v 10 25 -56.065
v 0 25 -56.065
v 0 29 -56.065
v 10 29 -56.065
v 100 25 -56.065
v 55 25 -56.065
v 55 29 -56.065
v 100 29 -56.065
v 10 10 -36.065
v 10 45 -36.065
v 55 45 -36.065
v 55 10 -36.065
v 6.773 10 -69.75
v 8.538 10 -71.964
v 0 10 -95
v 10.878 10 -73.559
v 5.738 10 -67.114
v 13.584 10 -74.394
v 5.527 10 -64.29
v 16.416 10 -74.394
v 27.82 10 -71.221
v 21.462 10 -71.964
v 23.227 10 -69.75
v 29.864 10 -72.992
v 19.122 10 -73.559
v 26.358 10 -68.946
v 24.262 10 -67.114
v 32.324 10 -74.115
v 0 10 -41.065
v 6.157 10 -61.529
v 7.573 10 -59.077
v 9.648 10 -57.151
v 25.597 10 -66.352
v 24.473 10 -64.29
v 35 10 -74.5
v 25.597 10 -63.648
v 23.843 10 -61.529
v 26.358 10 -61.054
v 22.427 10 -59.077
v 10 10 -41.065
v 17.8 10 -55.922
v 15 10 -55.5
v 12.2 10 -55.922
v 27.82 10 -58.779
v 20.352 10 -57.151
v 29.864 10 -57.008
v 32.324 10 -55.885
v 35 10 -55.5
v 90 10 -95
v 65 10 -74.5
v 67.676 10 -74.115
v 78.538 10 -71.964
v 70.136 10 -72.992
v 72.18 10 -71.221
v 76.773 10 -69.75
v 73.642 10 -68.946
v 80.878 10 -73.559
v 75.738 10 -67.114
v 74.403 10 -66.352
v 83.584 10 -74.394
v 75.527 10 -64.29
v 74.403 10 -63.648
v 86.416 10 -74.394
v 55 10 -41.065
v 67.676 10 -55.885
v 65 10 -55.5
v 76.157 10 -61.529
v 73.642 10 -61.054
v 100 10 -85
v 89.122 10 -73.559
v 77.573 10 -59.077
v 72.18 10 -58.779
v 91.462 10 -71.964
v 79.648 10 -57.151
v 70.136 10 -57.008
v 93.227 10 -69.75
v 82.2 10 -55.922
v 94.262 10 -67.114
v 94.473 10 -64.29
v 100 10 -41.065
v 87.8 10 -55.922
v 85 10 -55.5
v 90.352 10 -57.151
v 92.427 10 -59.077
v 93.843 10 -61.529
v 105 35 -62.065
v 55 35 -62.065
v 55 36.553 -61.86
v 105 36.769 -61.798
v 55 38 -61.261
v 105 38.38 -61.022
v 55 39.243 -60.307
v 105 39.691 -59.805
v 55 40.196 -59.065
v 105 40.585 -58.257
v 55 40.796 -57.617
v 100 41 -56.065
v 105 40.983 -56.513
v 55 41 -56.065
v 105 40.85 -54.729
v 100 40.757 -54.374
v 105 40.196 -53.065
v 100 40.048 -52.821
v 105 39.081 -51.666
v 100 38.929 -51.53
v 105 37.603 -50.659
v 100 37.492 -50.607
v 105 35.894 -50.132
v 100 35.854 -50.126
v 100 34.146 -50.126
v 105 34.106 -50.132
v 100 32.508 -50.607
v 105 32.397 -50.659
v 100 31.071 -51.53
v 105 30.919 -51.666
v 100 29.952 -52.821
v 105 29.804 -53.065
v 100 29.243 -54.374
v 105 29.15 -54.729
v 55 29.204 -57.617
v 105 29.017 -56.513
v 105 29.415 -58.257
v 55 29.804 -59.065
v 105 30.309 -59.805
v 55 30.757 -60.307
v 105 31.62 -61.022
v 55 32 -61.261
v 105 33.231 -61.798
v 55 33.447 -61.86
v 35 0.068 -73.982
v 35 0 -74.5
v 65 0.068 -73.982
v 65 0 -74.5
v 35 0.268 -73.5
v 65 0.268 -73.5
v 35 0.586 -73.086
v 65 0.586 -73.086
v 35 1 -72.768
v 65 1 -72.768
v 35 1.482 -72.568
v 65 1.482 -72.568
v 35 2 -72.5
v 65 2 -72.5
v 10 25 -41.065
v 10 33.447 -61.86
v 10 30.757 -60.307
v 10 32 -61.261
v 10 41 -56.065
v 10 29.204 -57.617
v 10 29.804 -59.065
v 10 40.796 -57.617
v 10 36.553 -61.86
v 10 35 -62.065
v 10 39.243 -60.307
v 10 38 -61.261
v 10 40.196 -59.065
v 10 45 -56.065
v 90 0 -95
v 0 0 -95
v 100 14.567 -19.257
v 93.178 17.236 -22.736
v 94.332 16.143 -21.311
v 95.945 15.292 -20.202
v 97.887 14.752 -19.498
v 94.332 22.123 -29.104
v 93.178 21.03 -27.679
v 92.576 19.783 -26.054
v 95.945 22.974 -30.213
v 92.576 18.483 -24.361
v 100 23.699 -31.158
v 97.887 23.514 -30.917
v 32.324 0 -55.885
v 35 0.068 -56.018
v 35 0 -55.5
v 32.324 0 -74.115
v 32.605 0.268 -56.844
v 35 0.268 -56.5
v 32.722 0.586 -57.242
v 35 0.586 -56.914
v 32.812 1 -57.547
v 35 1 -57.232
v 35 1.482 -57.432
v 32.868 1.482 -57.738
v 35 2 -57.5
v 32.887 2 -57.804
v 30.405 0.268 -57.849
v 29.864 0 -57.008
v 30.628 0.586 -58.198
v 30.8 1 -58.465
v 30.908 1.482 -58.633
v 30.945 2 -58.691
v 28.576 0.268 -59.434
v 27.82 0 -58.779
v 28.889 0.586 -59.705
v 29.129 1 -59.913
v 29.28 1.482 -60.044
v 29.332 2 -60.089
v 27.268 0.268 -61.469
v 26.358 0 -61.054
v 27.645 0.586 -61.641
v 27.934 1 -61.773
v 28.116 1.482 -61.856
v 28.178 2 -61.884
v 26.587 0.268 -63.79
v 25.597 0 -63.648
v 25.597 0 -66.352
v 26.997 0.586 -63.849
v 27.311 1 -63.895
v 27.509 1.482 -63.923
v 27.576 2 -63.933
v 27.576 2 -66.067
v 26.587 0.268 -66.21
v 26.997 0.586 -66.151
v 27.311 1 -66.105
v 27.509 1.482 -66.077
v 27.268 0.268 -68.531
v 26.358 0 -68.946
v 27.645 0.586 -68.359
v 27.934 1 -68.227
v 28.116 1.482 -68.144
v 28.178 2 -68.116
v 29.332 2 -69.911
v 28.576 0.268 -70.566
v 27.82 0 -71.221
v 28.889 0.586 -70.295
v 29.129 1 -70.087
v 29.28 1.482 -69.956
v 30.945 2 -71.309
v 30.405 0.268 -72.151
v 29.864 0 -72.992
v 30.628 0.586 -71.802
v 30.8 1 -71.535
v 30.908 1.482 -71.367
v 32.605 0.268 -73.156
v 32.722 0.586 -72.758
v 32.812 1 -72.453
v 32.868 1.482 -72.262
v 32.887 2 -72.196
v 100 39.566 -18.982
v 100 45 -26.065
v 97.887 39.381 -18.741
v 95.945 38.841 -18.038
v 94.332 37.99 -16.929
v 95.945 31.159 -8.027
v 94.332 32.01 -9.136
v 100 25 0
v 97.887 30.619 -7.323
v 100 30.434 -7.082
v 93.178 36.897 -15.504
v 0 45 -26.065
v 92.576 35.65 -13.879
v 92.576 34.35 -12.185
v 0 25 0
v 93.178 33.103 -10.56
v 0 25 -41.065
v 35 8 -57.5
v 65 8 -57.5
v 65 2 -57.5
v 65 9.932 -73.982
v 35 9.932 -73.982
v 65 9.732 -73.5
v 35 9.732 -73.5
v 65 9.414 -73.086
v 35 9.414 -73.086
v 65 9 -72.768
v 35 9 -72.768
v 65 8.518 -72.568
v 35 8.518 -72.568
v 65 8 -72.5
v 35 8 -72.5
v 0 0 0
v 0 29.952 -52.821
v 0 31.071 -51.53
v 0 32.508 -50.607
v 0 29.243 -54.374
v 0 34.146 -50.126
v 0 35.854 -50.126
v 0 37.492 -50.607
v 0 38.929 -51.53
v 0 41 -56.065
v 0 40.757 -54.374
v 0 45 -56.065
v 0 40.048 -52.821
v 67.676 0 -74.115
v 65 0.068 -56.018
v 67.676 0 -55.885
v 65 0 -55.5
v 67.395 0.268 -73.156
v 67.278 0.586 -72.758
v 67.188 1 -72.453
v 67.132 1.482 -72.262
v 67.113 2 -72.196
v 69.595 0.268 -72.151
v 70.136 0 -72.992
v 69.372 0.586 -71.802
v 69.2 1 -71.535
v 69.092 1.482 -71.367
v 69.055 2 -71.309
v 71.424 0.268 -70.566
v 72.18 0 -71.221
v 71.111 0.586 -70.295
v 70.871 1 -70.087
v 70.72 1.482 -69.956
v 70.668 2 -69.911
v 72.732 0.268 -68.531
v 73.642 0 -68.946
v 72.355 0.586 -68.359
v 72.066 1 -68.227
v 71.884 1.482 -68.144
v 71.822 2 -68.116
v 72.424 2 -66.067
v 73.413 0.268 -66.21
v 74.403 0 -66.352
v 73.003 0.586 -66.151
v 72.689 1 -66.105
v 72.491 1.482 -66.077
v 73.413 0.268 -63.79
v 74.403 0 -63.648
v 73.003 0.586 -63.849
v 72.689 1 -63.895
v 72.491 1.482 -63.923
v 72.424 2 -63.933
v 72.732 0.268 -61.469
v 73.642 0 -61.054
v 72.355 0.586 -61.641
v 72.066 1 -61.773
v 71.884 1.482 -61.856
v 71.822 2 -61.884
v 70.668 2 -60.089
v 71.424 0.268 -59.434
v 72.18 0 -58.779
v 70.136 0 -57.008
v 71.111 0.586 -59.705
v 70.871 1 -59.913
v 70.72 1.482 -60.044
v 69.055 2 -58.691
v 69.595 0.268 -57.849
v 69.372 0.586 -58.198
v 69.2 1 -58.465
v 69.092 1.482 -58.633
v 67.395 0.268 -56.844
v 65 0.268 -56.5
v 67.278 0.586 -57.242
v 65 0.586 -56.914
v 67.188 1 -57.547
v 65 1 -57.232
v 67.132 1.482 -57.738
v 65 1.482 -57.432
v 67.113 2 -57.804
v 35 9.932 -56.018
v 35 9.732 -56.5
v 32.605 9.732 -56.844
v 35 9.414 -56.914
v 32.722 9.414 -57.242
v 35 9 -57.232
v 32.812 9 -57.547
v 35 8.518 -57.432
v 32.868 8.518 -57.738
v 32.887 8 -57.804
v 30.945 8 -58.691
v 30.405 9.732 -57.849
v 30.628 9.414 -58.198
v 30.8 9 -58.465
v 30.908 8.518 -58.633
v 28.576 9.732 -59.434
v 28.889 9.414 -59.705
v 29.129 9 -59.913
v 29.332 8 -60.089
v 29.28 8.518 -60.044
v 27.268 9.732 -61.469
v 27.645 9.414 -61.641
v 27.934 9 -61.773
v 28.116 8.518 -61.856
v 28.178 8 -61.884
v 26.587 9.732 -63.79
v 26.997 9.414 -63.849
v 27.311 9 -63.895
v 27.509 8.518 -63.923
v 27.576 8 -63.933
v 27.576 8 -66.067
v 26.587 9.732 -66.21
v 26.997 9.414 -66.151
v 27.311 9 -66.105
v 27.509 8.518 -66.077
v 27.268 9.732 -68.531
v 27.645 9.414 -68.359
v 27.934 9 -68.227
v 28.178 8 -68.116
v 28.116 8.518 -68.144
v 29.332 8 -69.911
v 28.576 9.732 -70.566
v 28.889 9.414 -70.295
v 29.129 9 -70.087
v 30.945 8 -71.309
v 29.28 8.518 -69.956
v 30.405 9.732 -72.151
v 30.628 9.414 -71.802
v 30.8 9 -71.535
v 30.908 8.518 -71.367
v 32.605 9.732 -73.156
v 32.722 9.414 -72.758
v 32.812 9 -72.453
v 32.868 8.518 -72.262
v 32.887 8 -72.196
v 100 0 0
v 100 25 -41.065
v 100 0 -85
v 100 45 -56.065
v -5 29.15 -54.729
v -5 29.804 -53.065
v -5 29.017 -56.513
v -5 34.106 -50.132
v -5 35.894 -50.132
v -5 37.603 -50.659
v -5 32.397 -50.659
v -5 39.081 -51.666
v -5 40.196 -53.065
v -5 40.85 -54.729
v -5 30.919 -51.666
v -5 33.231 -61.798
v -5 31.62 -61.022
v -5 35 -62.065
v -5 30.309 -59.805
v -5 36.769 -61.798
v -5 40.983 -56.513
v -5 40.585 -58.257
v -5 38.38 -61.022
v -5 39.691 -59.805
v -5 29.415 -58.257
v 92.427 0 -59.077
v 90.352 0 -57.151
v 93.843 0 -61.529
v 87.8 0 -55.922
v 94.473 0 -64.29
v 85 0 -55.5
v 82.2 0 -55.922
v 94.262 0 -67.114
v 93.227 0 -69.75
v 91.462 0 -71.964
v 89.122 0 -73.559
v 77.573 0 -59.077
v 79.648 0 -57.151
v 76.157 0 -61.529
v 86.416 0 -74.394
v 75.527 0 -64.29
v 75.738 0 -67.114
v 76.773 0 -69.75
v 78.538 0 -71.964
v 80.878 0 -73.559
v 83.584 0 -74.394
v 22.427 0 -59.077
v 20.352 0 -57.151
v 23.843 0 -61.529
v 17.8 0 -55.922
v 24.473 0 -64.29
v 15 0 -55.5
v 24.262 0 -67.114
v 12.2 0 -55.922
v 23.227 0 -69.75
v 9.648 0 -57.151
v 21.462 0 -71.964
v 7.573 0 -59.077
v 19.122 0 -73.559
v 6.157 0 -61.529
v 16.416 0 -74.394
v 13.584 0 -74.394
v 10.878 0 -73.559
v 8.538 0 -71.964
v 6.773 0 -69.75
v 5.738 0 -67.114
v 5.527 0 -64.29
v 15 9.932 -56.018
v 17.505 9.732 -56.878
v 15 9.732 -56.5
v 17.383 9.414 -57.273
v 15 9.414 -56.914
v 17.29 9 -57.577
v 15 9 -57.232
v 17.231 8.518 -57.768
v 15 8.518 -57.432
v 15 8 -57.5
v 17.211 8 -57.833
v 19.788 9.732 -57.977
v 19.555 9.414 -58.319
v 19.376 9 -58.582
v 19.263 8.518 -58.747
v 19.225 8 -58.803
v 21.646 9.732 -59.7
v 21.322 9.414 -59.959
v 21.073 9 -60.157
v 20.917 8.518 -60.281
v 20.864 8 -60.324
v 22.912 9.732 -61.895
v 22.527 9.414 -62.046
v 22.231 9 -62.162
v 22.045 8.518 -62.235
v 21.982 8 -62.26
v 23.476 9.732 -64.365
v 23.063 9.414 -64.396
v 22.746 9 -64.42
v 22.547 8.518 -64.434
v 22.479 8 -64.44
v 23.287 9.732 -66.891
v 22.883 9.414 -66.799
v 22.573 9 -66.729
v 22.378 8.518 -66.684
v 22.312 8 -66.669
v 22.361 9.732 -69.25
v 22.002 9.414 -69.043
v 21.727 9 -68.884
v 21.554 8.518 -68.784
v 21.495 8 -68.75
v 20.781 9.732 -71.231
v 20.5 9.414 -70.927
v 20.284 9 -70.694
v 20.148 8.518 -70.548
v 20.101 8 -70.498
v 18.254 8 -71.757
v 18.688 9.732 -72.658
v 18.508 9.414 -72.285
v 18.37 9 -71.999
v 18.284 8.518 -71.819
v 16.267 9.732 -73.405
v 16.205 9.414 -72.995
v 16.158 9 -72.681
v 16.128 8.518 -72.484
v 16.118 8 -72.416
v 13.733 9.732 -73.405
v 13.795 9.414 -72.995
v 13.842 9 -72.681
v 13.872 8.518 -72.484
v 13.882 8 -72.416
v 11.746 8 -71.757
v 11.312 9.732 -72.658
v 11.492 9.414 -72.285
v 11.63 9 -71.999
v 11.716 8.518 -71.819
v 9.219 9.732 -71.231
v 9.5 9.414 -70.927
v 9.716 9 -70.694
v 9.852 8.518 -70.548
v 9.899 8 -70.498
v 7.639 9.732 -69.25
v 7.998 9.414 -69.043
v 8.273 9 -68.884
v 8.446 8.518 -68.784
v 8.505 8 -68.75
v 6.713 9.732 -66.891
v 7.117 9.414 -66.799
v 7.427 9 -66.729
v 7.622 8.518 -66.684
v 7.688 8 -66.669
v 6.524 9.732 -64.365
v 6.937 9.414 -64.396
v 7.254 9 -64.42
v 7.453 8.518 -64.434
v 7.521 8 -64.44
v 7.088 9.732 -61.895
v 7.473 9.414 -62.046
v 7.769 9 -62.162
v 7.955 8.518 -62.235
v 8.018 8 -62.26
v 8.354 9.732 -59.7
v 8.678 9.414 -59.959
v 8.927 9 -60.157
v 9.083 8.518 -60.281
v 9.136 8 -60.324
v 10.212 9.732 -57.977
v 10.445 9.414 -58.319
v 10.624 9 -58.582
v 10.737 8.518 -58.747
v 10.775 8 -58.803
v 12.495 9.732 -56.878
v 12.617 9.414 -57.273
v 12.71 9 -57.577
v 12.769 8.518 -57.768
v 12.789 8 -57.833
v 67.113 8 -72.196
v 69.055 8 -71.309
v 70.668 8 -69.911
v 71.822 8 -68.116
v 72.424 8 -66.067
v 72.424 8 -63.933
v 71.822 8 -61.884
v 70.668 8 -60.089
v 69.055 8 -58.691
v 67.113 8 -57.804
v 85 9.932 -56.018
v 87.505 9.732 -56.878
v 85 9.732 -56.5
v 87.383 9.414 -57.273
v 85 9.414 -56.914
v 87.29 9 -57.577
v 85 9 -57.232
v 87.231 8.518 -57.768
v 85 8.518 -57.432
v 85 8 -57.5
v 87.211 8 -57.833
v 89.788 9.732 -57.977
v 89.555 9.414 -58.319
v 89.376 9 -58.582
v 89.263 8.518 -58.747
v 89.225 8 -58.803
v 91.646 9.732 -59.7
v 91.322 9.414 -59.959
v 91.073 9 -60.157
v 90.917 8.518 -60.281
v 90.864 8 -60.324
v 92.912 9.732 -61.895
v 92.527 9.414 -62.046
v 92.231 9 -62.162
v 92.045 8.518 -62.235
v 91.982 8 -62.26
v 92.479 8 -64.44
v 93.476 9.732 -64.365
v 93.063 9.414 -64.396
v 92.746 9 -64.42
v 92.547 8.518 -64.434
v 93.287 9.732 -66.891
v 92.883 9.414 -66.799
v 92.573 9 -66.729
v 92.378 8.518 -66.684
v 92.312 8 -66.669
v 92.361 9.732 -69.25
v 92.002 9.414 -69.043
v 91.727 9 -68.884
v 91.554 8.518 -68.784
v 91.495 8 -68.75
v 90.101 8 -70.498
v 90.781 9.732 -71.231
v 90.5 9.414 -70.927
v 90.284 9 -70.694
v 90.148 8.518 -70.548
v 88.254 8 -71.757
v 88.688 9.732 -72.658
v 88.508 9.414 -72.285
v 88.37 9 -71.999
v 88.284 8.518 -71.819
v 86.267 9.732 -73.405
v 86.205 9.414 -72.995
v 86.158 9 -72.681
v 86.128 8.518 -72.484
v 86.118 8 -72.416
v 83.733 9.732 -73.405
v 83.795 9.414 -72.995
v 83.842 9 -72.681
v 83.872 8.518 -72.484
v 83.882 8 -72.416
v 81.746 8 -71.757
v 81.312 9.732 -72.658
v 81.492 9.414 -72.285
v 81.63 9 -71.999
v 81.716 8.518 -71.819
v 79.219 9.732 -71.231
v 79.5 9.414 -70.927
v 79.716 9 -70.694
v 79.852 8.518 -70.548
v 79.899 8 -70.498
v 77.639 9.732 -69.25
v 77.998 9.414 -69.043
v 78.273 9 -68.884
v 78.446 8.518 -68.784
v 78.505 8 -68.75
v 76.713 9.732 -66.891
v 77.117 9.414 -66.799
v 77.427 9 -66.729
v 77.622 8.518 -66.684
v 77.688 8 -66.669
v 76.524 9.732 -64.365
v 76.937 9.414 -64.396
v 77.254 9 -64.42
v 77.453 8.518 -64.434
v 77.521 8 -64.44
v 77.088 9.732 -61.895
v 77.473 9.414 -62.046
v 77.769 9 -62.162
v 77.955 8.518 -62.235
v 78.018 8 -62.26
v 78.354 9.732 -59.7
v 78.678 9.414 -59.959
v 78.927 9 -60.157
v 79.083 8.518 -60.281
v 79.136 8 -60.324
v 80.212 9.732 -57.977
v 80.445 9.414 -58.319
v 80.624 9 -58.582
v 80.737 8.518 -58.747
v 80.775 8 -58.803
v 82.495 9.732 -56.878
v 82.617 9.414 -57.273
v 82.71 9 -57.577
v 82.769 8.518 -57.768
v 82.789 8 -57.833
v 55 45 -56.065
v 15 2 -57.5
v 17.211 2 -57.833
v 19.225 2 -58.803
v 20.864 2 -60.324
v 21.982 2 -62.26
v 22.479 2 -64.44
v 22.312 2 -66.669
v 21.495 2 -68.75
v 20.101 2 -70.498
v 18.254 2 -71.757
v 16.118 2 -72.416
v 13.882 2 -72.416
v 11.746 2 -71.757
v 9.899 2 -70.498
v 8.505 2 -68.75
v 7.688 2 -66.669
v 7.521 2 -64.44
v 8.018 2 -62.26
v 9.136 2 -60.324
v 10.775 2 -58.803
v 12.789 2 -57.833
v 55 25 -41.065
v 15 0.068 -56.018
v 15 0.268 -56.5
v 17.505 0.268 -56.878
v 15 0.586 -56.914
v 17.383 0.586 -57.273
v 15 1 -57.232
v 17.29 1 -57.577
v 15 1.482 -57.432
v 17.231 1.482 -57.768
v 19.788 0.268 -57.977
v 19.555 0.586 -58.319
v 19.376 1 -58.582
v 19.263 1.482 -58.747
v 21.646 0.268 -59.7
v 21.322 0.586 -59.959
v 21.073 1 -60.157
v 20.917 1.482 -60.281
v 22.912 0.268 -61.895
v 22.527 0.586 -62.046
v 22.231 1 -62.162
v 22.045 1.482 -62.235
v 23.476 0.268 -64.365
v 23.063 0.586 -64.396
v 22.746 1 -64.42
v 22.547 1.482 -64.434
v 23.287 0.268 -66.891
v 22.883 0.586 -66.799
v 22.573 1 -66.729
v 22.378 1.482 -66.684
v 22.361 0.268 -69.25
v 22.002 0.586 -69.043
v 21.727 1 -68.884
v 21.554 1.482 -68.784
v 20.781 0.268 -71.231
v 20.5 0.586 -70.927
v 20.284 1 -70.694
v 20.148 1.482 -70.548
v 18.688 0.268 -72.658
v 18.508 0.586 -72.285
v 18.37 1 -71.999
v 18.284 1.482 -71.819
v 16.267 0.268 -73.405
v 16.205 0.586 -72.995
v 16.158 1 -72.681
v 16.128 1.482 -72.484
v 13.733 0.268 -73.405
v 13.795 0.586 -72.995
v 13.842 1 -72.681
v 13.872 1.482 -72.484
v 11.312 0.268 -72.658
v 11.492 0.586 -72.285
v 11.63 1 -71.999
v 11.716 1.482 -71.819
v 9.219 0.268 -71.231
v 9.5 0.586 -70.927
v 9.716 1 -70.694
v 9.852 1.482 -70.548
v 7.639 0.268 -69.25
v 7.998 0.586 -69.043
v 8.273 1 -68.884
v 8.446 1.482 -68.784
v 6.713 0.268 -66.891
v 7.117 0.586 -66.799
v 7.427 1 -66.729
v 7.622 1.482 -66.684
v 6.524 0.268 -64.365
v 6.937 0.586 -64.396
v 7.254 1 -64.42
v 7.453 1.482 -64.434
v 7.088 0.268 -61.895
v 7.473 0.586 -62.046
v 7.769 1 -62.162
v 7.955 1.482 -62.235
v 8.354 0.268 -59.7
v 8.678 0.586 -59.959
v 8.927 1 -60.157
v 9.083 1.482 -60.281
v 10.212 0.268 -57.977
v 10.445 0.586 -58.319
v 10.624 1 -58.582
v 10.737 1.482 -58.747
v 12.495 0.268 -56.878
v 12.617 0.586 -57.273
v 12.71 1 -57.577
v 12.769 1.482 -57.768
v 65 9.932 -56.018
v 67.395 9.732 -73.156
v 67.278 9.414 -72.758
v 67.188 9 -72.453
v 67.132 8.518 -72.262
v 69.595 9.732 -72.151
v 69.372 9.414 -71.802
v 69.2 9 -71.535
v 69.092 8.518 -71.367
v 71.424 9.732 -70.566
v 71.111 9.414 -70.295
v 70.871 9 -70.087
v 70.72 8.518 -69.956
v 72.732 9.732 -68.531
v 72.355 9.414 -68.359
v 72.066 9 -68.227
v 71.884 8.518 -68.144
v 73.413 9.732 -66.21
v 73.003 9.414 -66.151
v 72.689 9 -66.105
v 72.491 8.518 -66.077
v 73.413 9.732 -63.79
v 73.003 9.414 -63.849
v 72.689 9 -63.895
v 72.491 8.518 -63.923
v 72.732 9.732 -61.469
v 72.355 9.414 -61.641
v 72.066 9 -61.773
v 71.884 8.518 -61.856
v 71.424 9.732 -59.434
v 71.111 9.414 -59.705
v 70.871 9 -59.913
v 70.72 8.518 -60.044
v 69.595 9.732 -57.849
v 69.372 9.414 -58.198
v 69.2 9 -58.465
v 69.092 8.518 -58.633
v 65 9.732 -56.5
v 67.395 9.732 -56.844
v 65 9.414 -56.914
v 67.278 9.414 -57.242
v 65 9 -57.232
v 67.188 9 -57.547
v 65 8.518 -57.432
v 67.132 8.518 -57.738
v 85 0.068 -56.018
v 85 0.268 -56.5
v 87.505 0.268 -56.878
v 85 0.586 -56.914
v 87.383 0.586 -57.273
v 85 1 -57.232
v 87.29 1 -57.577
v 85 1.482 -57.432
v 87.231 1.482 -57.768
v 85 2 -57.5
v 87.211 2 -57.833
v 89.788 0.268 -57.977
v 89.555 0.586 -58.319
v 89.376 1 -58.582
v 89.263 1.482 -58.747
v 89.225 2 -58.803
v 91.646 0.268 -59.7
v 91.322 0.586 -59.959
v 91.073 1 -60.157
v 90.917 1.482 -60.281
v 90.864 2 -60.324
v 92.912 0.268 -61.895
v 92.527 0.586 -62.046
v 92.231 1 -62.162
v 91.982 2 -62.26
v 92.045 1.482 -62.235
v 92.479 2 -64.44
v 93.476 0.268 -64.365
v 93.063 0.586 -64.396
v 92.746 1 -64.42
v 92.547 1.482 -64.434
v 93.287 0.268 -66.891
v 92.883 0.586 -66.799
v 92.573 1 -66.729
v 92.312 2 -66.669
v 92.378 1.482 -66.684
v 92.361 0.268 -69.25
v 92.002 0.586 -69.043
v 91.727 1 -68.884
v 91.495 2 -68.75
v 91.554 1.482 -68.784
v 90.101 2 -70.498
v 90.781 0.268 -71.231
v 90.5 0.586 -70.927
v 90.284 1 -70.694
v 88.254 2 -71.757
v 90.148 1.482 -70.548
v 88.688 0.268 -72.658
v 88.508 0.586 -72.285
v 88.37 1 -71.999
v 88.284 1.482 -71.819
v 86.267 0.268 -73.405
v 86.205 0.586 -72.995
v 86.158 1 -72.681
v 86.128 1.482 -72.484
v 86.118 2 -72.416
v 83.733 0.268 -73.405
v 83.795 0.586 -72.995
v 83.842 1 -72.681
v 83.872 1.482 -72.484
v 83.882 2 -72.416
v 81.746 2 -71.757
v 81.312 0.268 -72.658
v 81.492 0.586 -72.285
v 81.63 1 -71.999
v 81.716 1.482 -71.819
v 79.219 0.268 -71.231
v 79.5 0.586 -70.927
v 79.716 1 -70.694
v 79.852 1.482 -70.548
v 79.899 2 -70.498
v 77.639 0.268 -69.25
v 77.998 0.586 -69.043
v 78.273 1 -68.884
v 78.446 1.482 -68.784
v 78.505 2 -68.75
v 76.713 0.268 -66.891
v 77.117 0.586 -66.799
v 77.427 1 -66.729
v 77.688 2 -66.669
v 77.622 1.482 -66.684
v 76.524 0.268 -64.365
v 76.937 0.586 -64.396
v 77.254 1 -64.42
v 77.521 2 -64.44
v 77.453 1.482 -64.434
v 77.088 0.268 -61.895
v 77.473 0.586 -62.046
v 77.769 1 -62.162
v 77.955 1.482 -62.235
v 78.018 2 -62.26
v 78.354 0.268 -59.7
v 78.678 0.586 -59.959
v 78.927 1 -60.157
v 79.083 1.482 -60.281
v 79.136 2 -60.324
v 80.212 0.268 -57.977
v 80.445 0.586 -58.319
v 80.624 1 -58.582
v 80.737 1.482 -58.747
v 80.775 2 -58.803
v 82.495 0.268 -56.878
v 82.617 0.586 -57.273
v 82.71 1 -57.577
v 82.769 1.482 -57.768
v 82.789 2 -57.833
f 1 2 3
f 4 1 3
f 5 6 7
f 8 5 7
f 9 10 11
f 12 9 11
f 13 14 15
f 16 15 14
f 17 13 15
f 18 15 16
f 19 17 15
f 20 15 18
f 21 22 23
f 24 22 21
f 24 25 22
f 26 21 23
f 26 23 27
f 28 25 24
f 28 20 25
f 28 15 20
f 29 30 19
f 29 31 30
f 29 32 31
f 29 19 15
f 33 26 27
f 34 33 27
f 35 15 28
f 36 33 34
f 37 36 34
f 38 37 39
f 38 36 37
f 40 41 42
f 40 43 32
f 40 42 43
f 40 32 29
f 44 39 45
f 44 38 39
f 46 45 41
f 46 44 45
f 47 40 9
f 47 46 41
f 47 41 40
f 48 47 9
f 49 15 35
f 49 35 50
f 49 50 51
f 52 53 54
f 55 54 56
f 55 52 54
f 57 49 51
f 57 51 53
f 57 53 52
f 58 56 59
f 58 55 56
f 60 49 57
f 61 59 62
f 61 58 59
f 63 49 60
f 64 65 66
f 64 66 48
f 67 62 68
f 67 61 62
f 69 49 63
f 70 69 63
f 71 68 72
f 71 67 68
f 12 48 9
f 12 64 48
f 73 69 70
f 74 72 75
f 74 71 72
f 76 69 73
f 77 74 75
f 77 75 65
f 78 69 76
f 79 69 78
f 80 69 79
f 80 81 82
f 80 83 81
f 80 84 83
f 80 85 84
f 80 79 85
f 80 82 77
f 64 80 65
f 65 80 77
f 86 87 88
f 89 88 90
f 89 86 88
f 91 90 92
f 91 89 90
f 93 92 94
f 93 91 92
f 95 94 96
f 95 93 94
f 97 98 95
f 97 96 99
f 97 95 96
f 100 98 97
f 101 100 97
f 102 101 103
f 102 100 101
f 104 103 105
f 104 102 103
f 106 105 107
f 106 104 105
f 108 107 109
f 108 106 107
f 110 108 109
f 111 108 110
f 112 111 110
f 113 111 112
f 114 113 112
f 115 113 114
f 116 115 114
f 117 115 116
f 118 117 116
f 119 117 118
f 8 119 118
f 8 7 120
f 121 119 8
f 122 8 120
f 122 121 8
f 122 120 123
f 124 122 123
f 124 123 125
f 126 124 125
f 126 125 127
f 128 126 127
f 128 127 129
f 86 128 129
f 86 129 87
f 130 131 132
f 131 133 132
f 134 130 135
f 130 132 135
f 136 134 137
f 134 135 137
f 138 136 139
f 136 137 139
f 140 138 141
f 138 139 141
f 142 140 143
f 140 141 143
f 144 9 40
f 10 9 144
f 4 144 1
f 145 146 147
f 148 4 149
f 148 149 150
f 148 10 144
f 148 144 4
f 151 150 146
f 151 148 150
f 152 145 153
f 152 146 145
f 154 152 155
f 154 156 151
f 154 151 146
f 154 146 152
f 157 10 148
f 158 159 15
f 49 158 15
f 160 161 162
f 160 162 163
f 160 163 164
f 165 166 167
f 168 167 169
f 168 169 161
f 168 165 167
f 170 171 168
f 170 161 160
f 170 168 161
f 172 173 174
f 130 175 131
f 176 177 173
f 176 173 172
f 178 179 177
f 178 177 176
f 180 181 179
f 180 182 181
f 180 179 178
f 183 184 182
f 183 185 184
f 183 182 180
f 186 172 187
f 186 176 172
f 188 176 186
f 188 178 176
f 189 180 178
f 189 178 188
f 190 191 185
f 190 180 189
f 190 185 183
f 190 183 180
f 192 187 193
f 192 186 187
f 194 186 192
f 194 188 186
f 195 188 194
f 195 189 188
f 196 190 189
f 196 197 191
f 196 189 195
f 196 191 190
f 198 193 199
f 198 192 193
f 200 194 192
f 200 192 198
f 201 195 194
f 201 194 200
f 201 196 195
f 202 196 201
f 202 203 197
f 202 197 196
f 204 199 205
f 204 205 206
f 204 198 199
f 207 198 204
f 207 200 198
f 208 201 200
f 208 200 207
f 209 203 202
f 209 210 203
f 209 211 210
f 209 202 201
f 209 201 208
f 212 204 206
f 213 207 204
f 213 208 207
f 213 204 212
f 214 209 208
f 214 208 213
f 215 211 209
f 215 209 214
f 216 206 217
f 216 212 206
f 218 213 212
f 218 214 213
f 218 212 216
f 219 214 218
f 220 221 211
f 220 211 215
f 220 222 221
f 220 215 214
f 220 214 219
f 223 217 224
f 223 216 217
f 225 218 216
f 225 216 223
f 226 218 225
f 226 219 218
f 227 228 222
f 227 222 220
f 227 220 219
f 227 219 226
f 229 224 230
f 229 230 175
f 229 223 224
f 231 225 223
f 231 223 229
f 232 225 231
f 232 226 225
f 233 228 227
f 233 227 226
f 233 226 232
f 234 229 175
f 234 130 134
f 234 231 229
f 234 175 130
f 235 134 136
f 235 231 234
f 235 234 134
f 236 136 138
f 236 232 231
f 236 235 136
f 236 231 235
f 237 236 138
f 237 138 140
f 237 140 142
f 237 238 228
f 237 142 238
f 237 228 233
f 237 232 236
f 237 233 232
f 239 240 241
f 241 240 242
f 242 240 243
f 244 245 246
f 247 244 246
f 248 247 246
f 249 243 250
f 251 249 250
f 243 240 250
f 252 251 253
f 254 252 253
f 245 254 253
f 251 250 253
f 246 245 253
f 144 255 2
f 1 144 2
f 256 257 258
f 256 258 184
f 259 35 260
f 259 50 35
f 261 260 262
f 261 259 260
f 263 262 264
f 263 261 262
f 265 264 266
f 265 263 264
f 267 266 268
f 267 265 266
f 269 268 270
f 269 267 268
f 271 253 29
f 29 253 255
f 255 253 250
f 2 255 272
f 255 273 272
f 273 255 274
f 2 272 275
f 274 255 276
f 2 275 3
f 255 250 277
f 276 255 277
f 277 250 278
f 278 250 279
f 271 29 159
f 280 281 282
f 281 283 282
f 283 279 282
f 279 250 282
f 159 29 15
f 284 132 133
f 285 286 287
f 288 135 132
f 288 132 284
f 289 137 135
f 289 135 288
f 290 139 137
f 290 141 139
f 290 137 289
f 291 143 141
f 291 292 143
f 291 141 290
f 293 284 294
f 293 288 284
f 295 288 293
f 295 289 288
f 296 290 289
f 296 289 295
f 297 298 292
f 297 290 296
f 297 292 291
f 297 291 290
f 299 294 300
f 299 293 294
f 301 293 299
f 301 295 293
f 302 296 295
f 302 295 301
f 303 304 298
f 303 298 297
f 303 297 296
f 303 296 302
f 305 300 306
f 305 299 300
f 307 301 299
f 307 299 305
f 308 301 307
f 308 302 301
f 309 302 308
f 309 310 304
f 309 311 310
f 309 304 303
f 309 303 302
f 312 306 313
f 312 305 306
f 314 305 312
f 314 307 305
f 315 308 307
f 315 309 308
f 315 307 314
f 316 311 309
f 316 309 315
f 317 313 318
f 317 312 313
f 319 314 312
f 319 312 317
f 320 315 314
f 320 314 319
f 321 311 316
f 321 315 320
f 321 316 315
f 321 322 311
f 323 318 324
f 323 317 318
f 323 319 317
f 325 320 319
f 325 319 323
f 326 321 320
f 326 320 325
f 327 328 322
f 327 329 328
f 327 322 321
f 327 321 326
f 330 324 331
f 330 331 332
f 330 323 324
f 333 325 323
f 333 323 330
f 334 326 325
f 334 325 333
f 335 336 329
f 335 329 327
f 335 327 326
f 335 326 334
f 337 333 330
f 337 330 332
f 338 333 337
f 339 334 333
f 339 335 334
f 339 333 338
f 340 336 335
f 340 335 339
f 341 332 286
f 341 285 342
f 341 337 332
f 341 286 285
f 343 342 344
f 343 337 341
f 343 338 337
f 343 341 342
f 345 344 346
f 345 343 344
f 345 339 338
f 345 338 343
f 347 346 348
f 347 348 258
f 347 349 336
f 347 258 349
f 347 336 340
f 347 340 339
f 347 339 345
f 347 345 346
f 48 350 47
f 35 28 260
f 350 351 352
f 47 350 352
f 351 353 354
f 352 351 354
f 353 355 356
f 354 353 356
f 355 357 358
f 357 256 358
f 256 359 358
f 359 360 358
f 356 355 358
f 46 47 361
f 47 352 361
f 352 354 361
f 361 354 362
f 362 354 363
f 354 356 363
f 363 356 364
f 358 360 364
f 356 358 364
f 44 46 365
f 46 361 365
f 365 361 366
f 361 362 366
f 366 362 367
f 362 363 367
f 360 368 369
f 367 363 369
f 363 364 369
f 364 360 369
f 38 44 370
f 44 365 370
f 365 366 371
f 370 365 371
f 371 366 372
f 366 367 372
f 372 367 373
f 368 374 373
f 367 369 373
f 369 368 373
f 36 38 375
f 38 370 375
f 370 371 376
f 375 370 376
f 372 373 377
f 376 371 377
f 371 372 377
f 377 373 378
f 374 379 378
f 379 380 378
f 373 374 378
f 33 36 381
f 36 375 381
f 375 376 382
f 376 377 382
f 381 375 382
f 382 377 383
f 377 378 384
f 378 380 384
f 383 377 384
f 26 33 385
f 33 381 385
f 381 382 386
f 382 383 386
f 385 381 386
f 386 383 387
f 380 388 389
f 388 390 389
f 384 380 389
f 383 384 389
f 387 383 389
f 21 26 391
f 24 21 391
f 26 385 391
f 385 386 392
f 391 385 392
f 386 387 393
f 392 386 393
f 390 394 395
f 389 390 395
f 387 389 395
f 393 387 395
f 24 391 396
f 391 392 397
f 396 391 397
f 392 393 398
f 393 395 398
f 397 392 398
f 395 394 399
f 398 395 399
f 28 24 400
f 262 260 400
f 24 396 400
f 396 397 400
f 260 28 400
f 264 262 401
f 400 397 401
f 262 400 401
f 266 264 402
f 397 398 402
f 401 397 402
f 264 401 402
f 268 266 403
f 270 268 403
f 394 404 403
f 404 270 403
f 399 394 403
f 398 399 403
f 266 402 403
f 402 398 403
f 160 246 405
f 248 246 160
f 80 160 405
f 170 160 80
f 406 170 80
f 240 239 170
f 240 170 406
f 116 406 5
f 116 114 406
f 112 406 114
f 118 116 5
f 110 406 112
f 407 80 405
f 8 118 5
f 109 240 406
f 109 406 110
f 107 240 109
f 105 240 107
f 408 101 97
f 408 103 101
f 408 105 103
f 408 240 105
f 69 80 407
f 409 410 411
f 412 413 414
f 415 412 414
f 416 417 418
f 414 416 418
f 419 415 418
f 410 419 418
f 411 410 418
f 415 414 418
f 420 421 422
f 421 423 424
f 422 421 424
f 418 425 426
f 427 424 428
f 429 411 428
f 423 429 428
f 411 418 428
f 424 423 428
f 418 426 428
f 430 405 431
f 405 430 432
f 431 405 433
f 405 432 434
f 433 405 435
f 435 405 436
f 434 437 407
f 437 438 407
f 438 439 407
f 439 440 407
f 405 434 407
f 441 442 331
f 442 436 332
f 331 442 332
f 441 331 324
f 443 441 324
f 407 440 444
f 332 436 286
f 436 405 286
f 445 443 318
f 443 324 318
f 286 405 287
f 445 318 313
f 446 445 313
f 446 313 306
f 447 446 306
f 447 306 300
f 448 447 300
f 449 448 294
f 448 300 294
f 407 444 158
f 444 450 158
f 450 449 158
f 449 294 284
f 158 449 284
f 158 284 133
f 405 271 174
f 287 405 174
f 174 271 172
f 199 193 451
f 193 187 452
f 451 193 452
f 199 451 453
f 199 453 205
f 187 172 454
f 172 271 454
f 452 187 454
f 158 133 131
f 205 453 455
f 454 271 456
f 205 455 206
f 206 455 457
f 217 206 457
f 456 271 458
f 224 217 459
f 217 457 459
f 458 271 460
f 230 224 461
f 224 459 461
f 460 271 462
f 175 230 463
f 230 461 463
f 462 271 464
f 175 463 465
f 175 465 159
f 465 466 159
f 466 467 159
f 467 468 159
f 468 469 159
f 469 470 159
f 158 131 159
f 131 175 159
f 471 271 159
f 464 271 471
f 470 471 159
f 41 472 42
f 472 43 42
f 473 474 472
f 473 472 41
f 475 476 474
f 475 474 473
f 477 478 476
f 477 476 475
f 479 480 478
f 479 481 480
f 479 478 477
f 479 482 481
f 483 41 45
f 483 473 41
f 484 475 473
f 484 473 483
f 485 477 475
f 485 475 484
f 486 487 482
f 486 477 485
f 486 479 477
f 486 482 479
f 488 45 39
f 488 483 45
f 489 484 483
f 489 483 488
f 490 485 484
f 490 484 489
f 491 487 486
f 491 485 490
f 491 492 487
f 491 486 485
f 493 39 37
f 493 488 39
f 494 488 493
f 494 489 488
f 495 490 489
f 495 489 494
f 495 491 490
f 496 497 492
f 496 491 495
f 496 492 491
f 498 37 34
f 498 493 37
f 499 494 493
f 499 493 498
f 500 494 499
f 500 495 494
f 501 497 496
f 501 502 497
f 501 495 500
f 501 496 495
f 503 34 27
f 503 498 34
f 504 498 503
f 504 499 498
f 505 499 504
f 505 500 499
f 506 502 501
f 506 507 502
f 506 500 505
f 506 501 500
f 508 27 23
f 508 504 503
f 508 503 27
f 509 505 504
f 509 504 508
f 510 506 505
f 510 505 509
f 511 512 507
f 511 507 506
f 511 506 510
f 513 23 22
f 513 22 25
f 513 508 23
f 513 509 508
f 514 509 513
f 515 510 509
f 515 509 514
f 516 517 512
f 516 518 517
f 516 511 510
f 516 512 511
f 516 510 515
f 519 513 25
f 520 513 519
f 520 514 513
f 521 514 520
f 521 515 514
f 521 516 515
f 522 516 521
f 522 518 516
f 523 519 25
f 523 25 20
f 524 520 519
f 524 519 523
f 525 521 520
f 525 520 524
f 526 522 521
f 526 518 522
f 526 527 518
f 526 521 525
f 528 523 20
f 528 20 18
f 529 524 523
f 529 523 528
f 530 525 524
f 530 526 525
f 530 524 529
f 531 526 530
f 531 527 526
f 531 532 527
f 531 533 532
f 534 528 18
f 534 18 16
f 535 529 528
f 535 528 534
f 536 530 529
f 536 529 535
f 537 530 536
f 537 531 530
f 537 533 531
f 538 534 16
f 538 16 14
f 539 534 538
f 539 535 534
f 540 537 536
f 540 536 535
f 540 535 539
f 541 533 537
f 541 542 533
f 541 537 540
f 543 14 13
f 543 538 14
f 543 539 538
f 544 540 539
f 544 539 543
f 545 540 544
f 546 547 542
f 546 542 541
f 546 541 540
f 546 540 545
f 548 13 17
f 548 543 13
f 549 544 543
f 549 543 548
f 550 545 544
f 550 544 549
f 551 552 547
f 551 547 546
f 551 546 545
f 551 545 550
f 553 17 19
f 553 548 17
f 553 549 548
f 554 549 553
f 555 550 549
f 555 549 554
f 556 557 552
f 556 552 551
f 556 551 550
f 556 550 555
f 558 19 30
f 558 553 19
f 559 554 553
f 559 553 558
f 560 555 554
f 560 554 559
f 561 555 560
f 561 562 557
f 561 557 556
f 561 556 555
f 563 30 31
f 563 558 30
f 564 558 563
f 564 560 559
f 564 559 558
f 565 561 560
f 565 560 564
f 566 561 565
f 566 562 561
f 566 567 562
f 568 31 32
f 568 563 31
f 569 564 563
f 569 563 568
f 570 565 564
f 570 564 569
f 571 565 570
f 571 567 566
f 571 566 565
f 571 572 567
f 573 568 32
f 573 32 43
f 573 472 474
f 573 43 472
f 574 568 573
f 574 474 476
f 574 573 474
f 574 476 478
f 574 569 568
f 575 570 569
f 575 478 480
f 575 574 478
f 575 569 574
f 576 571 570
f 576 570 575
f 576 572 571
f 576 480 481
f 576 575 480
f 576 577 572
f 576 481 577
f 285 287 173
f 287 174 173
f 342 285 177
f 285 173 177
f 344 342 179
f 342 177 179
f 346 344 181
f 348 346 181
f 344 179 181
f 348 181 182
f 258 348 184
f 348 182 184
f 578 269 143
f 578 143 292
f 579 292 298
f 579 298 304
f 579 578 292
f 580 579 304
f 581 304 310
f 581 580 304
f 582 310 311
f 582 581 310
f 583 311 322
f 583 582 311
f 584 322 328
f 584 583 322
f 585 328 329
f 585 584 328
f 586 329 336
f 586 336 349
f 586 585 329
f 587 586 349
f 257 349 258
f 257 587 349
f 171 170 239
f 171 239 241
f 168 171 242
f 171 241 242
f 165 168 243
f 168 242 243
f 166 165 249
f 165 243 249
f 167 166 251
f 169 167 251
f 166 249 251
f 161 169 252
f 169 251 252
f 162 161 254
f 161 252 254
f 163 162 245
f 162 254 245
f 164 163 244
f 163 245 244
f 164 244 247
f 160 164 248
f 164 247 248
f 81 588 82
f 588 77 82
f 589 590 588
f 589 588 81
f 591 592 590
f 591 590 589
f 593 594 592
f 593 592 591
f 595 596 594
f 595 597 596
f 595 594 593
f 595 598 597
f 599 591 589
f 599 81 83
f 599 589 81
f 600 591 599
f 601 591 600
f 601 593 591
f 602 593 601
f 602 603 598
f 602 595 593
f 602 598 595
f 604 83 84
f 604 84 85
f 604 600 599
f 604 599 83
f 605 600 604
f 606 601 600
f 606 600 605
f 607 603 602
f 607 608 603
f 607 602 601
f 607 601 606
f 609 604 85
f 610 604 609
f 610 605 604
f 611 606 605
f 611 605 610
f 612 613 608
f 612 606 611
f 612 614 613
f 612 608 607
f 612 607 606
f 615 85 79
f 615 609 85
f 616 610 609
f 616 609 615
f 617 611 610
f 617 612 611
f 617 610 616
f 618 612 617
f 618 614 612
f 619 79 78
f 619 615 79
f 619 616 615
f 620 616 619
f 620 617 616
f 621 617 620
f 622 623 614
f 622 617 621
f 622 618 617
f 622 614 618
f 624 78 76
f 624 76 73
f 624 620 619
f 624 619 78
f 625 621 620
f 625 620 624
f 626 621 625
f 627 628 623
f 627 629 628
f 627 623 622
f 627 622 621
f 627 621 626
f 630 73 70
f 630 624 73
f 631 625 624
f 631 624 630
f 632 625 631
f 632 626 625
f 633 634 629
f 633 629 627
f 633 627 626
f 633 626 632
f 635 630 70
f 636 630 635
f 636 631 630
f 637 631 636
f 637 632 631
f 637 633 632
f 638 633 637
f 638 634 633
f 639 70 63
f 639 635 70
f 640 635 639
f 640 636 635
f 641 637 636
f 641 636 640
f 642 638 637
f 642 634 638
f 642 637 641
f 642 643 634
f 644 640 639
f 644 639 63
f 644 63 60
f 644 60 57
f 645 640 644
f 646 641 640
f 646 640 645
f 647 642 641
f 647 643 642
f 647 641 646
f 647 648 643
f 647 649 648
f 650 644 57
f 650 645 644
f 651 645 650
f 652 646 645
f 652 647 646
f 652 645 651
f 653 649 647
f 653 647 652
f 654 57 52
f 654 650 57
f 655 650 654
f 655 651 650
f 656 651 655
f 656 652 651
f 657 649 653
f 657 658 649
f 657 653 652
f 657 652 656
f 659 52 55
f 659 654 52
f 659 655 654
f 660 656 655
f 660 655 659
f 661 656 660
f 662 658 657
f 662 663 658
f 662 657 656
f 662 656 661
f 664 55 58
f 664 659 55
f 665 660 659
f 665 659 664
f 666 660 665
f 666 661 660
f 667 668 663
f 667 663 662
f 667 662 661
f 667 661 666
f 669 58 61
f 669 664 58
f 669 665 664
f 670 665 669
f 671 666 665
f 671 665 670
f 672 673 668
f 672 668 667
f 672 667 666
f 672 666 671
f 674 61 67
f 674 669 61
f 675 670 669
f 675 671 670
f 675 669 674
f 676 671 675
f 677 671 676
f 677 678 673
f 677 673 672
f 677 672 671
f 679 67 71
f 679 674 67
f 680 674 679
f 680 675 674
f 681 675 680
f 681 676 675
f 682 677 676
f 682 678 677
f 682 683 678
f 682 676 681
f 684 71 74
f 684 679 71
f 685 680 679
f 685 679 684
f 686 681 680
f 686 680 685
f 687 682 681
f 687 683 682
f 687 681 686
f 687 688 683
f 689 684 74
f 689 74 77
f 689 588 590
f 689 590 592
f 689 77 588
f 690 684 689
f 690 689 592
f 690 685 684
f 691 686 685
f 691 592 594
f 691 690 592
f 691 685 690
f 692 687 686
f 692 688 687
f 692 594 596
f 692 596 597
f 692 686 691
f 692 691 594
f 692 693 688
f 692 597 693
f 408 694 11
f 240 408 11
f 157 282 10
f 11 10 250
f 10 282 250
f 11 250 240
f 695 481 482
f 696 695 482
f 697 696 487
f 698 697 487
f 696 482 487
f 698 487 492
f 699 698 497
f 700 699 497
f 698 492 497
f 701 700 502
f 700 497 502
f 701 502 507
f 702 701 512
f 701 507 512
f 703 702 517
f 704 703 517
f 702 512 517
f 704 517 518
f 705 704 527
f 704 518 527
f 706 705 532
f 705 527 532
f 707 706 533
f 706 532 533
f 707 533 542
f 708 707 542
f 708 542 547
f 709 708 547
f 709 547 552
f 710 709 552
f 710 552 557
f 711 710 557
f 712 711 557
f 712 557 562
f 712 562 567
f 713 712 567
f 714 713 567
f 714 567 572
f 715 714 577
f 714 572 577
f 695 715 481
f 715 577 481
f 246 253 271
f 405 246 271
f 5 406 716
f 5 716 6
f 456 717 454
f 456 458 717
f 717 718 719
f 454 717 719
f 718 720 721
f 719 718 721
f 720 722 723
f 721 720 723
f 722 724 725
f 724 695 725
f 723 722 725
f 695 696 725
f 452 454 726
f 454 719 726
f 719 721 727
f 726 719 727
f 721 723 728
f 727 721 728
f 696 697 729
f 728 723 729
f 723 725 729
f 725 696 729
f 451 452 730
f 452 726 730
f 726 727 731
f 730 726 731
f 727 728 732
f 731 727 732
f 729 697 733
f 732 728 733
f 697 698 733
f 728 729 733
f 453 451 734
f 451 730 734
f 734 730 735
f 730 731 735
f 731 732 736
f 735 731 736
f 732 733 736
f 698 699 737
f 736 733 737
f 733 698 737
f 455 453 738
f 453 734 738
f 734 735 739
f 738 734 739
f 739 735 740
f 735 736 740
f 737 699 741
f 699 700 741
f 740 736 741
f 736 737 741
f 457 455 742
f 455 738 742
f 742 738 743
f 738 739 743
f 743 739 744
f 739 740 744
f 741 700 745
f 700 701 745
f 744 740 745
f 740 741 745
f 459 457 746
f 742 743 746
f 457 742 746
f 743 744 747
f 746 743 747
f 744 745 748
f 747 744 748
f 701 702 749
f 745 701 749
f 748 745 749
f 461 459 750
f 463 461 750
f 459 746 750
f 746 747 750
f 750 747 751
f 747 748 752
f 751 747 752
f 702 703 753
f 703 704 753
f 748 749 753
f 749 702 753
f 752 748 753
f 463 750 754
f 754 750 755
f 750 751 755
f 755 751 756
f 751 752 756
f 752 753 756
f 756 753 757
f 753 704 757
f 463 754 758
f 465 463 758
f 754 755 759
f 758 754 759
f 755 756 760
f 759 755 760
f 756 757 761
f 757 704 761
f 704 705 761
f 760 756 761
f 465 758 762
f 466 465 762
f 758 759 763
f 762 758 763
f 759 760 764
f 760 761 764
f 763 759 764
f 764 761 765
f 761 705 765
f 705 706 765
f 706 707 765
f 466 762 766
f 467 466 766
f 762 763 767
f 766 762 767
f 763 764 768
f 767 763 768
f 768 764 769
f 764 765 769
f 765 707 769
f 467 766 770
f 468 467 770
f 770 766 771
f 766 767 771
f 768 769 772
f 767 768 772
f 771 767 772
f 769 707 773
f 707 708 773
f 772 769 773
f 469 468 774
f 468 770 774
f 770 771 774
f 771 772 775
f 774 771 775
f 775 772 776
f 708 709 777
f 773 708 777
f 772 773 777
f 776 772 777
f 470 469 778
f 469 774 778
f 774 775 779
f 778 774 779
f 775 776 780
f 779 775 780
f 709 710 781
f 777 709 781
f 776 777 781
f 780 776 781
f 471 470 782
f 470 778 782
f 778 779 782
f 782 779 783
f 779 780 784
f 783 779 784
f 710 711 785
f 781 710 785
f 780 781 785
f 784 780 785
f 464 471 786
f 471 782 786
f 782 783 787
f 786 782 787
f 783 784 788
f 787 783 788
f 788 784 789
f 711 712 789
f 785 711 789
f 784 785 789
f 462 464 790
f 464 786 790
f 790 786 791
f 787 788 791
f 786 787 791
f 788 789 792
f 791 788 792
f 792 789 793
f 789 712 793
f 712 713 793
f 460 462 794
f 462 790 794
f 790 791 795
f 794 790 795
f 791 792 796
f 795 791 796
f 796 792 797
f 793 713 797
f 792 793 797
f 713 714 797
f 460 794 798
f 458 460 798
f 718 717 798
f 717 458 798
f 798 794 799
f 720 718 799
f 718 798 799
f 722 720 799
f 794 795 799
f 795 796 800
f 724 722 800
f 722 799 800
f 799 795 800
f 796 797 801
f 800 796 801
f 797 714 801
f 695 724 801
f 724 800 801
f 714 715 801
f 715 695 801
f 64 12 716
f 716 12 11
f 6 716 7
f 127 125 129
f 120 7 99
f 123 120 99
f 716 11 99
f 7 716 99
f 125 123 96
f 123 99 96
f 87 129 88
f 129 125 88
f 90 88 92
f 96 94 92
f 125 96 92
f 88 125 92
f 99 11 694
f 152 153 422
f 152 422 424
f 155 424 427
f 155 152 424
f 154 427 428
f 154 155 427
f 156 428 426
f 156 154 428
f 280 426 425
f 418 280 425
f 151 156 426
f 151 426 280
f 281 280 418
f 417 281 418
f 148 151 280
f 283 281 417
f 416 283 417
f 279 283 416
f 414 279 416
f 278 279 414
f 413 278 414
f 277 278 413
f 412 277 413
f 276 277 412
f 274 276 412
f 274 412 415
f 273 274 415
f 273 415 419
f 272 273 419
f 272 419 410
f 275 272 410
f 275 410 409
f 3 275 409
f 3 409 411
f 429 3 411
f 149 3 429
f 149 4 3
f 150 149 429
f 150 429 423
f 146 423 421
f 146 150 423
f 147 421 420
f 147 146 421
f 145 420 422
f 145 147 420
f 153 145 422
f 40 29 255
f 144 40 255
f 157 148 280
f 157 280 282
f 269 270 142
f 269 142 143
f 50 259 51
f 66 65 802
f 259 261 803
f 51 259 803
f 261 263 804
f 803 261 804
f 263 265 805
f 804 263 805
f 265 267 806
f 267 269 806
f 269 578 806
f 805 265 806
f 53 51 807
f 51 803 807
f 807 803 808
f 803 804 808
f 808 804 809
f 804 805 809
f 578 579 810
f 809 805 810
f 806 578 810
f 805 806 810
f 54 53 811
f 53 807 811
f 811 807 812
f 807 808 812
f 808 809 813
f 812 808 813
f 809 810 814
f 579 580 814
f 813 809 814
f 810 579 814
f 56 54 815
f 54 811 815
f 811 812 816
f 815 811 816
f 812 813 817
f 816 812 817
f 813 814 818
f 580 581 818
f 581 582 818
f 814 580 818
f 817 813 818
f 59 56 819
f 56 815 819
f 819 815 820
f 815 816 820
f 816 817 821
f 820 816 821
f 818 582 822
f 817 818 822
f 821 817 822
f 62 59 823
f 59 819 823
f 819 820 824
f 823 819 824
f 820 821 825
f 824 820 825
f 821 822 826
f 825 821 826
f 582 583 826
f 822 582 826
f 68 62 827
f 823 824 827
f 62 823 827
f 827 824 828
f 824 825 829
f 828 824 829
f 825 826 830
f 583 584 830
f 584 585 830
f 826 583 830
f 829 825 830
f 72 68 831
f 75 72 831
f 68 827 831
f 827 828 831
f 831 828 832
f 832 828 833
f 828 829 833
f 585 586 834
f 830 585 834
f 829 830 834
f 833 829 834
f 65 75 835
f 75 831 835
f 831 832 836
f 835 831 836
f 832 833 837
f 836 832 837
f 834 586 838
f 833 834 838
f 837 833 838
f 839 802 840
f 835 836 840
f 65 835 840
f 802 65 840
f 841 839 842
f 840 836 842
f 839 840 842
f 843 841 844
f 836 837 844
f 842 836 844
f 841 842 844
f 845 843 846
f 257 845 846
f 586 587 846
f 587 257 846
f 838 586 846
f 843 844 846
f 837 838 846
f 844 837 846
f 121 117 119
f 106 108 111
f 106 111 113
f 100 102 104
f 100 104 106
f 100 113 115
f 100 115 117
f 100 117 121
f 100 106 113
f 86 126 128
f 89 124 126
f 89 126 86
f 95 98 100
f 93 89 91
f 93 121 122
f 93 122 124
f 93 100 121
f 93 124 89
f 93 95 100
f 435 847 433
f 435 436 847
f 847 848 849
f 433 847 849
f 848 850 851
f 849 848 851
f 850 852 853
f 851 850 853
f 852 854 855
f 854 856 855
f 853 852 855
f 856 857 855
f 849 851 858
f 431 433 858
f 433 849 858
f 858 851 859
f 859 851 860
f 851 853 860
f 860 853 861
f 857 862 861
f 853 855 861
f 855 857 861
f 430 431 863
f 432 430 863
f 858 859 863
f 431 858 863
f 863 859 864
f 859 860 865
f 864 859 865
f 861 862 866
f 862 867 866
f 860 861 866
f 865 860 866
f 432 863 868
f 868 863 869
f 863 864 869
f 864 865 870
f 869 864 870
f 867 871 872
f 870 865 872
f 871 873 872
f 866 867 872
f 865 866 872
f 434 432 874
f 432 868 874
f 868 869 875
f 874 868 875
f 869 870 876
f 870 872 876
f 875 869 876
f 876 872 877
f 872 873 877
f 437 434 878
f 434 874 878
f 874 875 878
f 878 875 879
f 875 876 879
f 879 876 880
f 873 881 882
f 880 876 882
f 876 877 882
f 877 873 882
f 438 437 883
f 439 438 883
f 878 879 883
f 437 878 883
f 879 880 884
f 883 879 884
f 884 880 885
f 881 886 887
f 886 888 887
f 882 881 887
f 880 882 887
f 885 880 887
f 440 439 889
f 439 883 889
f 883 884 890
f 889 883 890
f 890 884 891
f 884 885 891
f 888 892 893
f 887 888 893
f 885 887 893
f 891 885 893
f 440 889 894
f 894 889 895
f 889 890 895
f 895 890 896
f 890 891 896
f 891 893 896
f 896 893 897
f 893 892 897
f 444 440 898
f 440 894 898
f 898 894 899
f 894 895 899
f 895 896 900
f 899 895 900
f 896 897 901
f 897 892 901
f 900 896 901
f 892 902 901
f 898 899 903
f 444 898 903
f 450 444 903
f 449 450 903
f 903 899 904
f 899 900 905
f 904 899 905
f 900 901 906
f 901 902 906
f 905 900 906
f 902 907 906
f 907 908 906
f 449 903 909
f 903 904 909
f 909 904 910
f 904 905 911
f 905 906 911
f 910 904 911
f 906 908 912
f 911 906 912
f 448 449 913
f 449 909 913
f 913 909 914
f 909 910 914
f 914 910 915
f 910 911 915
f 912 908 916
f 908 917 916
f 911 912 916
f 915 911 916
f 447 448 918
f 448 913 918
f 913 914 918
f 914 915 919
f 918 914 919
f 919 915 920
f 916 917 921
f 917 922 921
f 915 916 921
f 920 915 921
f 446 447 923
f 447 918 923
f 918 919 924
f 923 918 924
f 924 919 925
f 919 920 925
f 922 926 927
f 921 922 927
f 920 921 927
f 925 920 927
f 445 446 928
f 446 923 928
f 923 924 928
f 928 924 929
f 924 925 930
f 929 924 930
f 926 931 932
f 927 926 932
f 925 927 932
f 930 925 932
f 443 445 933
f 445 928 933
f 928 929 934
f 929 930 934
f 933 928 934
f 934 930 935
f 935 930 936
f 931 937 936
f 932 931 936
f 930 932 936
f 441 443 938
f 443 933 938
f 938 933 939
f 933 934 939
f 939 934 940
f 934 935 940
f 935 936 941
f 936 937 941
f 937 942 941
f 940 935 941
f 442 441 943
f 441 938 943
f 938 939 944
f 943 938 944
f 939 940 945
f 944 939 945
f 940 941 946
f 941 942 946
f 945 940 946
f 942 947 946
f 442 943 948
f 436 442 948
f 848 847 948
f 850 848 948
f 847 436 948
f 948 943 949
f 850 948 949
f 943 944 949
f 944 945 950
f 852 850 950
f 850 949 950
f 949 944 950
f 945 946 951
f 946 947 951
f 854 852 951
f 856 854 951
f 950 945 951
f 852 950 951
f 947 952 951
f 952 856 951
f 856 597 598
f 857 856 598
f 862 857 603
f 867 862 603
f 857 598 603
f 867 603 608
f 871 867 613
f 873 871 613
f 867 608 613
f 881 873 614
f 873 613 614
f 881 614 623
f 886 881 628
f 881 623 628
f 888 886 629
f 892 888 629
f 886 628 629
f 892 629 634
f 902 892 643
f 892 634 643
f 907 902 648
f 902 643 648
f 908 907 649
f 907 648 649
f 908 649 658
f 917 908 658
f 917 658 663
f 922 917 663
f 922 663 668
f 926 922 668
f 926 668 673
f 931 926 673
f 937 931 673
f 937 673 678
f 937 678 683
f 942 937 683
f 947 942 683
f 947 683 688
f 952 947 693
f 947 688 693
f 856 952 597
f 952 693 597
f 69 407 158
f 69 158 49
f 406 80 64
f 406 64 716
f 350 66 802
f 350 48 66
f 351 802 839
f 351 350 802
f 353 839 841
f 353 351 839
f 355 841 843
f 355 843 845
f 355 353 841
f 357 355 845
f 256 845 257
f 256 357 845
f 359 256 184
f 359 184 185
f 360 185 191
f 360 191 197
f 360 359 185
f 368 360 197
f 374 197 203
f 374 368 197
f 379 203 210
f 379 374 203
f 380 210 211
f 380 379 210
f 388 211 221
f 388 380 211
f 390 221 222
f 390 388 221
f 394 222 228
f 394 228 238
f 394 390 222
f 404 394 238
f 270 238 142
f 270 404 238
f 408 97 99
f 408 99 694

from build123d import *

# Parameters (mm, degrees)
EXTRUDE_1_DEPTH     = 100
SKETCH_2_R          = 6
EXTRUDE_2_DEPTH     = 105
EXTRUDE_START       = 5
SKETCH_2_2_R        = 6
EXTRUDE_3_DEPTH     = 5
CUT_EXTRUDE_1_REACH = 150.577
SKETCH_4_W          = 45
SKETCH_4_H          = 26
SKETCH_6_R          = 7.5
CUT_EXTRUDE_4_DEPTH = 20
SKETCH_7_R          = 7.5
CUT_EXTRUDE_5_DEPTH = 10
FILLET_1_R          = 2
CHAMFER_1_SIZE      = 10


with BuildPart() as part:
    # 草图1 → 凸台-拉伸1 (new body)
    with BuildSketch(Plane(origin=(0, 0, 0), x_dir=(0, 0, -1), z_dir=(1, 0, 0))):
        Polygon((0, 0), (95, 0), (95, 10), (41.064507457, 10), (41.064507457, 25), (56.064507457, 25), (56.064507457, 45), (26.064507457, 45), (0, 25), align=None)
    extrude(amount=EXTRUDE_1_DEPTH)

    # 草图2 → 凸台-拉伸2 (add)
    with BuildSketch(Plane(origin=(100, 0, 0), x_dir=(0, 0, -1), z_dir=(1, 0, 0))):
        with Locations((56.064507457, 35)):
            Circle(SKETCH_2_R)
    extrude(amount=-EXTRUDE_2_DEPTH)

    # 草图2<2> → 凸台-拉伸3 (add)
    with BuildSketch(Plane(origin=(100, 0, 0), x_dir=(0, 0, -1), z_dir=(1, 0, 0)).offset(EXTRUDE_START)):
        with Locations((56.064507457, 35)):
            Circle(SKETCH_2_2_R)
    extrude(amount=-EXTRUDE_3_DEPTH)

    # 切除-拉伸1: up to this face of the body (flat: up to its plane)
    cut_extrude_1_end = Plane(part.part.faces().sort_by_distance((50, 10, -68.032253728))[0])
    # 草图4 → 切除-拉伸1 (cut, up to the picked face)
    with BuildSketch(Plane(origin=(0, 45, 0), x_dir=(1, 0, 0), z_dir=(0, 1, 0)), mode=Mode.PRIVATE) as cut_extrude_1_sk1:
        with Locations((32.5, 49.064507457)):
            Rectangle(SKETCH_4_W, SKETCH_4_H)
    cut_extrude_1_tool1 = split(extrude(cut_extrude_1_sk1.sketch, amount=-CUT_EXTRUDE_1_REACH, mode=Mode.PRIVATE), bisect_by=cut_extrude_1_end, keep=Keep.BOTH, mode=Mode.PRIVATE)
    add(cut_extrude_1_tool1.solids().sort_by(Axis((32.5, 45, -49.064507), (0, -1, 0)))[0], mode=Mode.SUBTRACT)

    # 草图6 → 切除-拉伸4 (cut)
    with BuildSketch(Plane(origin=(0, 15.735238064, 12.074072829), x_dir=(1, 0, 0), z_dir=(0, 0.7933533402912367, 0.6087614290087189))):
        with Locations((100, 31.645832042)):
            Circle(SKETCH_6_R)
    extrude(amount=-CUT_EXTRUDE_4_DEPTH, mode=Mode.SUBTRACT)

    # 草图7 → 切除-拉伸5 (cut)
    with BuildSketch(Plane(origin=(0, 10, 0), x_dir=(1, 0, 0), z_dir=(0, 1, 0))):
        with Locations(Location((15, 65, 0), (0, 0, 270))):
            Circle(SKETCH_7_R)
        with Locations(Location((85, 65, 0), (0, 0, 270))):
            Circle(SKETCH_7_R)
        with BuildLine():
            Line((35, 72.5), (65, 72.5))
            ThreePointArc((65, 72.5), (72.5, 65), (65, 57.5))
            Line((65, 57.5), (35, 57.5))
            ThreePointArc((35, 57.5), (27.5, 65), (35, 72.5))
        make_face()
    extrude(amount=-CUT_EXTRUDE_5_DEPTH, mode=Mode.SUBTRACT)

    # 圆角1
    fillet_1_edges = [part.edges().sort_by_distance(p)[0] for p in [
        (15, 10, -72.5),
        (15, 0, -72.5),
        (85, 10, -72.5),
        (85, 0, -72.5),
        (27.5, 10, -65),
        (50, 10, -57.5),
        (72.5, 10, -65),
        (50, 10, -72.5),
        (27.5, 0, -65),
        (50, 0, -72.5),
        (72.5, 0, -65),
        (50, 0, -57.5),
    ]]
    fillet(fillet_1_edges, radius=FILLET_1_R)

    # 倒角1
    chamfer_1_edges = [part.edges().sort_by_distance(p)[0] for p in [
        (100, 5, -95),
    ]]
    chamfer(chamfer_1_edges, length=CHAMFER_1_SIZE)


solid = part.part
